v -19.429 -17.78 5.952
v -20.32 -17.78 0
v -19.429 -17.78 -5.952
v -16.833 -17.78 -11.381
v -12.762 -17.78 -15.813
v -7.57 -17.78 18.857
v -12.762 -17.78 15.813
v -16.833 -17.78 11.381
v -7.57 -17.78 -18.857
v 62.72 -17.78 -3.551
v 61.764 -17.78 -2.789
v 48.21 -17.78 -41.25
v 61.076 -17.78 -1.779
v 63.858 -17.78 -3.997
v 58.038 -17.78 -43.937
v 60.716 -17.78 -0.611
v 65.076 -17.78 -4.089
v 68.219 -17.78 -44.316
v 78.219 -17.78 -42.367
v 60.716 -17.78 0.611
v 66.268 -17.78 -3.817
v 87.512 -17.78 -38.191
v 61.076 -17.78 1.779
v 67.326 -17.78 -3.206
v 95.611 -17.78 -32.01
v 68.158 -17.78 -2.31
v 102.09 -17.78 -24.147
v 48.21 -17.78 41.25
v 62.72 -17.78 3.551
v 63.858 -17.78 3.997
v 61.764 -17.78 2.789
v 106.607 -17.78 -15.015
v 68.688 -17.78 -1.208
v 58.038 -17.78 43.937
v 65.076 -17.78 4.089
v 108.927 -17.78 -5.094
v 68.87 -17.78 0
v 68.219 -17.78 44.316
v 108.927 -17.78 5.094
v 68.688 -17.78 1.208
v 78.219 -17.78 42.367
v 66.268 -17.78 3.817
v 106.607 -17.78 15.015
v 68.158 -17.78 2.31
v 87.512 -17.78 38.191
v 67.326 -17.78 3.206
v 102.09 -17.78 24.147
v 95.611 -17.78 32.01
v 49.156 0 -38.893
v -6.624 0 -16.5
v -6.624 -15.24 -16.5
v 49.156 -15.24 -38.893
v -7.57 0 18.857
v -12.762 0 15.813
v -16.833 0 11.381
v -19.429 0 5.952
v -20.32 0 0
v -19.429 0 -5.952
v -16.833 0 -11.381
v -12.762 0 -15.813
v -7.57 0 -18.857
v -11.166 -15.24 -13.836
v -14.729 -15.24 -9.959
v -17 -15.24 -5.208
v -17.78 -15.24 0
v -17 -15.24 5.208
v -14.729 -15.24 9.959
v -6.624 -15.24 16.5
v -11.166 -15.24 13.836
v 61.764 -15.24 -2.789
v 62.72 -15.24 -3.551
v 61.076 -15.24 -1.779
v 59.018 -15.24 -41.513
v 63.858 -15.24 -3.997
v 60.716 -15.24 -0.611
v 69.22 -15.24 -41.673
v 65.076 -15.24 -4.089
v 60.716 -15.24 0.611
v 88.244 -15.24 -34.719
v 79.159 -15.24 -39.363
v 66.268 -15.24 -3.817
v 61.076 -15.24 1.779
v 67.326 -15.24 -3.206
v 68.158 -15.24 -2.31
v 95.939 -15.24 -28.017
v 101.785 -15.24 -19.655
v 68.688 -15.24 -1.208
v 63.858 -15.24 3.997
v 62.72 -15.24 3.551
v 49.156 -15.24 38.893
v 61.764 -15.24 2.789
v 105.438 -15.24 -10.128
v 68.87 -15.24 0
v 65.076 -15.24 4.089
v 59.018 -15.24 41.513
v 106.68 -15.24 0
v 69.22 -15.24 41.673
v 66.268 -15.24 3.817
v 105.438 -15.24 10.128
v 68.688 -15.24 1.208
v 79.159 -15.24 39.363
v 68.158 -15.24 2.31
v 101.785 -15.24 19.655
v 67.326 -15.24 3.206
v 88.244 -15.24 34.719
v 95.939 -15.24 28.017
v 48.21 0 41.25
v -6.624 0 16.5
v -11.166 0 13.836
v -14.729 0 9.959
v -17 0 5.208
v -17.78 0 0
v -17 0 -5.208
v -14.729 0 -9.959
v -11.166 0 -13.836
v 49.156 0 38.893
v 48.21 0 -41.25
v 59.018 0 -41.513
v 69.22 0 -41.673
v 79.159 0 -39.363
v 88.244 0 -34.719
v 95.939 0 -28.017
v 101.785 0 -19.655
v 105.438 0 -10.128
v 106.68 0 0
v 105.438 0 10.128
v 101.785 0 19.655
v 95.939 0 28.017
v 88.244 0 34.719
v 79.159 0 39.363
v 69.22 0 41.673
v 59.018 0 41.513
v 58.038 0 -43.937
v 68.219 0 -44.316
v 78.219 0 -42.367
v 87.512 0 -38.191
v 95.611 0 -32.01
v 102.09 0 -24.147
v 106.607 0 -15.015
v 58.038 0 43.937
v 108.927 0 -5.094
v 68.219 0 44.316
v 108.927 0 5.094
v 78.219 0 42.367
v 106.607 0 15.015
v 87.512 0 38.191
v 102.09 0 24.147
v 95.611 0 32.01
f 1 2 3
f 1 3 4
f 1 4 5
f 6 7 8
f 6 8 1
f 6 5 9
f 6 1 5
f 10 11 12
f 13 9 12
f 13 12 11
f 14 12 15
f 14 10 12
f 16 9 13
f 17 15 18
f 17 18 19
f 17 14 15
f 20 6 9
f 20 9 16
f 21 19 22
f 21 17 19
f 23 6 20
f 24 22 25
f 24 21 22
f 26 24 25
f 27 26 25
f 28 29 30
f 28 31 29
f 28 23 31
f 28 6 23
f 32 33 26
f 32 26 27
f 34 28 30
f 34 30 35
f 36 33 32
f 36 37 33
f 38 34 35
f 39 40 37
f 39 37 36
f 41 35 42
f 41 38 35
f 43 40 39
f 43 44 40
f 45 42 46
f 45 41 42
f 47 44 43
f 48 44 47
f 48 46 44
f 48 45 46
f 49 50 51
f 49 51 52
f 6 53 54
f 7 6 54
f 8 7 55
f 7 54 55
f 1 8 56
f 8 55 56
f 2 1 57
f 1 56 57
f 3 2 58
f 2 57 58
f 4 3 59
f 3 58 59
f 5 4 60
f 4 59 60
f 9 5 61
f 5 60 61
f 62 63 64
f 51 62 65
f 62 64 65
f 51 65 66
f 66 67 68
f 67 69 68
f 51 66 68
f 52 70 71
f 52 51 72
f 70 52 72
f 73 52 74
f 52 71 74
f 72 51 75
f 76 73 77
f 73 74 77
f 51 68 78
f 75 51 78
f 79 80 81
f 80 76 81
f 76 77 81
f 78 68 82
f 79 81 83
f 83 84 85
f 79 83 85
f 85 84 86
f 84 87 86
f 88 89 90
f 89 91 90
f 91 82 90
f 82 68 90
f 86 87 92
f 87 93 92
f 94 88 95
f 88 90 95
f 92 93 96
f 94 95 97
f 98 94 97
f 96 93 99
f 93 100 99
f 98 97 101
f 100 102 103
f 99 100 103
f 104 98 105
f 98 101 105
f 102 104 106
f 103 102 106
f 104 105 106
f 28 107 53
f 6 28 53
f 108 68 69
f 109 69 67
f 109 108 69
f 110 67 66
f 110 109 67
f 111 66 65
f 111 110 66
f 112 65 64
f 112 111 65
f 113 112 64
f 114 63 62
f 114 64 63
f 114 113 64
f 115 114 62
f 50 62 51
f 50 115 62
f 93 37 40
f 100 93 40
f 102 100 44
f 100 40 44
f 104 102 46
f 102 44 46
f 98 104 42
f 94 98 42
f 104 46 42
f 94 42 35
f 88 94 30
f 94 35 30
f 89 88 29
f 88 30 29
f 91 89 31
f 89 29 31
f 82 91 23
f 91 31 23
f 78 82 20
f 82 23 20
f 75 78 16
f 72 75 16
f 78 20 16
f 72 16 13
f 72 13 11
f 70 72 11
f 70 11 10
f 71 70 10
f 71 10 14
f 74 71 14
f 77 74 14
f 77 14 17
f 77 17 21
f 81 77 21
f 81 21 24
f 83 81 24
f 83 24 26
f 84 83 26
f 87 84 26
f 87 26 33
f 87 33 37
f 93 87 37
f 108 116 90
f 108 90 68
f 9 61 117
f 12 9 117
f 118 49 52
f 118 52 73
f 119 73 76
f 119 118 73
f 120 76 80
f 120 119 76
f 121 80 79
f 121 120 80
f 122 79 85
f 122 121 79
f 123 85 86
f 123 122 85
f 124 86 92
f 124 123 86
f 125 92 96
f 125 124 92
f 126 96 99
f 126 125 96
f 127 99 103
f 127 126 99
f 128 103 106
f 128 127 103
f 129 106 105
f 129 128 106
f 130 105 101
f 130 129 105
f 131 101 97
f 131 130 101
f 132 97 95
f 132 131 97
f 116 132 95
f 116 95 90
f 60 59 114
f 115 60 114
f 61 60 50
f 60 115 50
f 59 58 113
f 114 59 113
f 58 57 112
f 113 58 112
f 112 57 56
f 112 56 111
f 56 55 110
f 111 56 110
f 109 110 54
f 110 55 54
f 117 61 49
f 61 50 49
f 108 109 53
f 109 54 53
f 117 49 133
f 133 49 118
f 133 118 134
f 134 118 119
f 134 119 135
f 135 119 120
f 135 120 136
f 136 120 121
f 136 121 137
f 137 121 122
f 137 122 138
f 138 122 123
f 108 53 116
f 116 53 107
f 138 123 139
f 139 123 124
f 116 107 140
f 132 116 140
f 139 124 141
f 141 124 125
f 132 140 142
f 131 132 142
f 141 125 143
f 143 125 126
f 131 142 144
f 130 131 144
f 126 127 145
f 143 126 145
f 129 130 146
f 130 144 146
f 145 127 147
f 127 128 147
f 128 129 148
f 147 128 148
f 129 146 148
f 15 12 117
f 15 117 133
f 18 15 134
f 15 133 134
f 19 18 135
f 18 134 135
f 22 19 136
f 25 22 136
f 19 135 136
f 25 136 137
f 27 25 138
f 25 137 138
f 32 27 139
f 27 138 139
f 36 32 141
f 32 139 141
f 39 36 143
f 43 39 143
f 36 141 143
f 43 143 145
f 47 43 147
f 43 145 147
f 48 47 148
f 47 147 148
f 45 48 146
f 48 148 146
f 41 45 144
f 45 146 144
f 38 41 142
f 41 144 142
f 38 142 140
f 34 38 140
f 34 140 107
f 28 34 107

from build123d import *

# Parameters (mm, degrees)
F1_DEPTH = 17.78
F2_T     = -2.54
F3_R     = 4.1
F4_DEPTH = 25.4


with BuildPart() as f1:
    # F0 (on Front) → F1 (new body)
    with BuildSketch(Plane.XZ):
        with BuildLine():
            Line((48.210196, 41.250156), (-7.570196, 18.857214))
            ThreePointArc((-7.570196, 18.857214), (-20.32, 0), (-7.570196, -18.857214))
            Line((-7.570196, -18.857214), (48.210196, -41.250156))
            ThreePointArc((48.210196, -41.250156), (109.22, 0), (48.210196, 41.250156))
        make_face()
    extrude(amount=F1_DEPTH)

    # F2
    f2_openings = [f1.faces().sort_by_distance(p)[0] for p in [
        (50.495469, 0, 0),
    ]]
    offset(amount=F2_T, openings=f2_openings)

    # F3 (on face) → F4 (cut)
    with BuildSketch(Plane.XZ.offset(17.78)):
        with Locations((64.77, 0)):
            Circle(F3_R)
    extrude(amount=-F4_DEPTH, mode=Mode.SUBTRACT)


solid = f1.part
